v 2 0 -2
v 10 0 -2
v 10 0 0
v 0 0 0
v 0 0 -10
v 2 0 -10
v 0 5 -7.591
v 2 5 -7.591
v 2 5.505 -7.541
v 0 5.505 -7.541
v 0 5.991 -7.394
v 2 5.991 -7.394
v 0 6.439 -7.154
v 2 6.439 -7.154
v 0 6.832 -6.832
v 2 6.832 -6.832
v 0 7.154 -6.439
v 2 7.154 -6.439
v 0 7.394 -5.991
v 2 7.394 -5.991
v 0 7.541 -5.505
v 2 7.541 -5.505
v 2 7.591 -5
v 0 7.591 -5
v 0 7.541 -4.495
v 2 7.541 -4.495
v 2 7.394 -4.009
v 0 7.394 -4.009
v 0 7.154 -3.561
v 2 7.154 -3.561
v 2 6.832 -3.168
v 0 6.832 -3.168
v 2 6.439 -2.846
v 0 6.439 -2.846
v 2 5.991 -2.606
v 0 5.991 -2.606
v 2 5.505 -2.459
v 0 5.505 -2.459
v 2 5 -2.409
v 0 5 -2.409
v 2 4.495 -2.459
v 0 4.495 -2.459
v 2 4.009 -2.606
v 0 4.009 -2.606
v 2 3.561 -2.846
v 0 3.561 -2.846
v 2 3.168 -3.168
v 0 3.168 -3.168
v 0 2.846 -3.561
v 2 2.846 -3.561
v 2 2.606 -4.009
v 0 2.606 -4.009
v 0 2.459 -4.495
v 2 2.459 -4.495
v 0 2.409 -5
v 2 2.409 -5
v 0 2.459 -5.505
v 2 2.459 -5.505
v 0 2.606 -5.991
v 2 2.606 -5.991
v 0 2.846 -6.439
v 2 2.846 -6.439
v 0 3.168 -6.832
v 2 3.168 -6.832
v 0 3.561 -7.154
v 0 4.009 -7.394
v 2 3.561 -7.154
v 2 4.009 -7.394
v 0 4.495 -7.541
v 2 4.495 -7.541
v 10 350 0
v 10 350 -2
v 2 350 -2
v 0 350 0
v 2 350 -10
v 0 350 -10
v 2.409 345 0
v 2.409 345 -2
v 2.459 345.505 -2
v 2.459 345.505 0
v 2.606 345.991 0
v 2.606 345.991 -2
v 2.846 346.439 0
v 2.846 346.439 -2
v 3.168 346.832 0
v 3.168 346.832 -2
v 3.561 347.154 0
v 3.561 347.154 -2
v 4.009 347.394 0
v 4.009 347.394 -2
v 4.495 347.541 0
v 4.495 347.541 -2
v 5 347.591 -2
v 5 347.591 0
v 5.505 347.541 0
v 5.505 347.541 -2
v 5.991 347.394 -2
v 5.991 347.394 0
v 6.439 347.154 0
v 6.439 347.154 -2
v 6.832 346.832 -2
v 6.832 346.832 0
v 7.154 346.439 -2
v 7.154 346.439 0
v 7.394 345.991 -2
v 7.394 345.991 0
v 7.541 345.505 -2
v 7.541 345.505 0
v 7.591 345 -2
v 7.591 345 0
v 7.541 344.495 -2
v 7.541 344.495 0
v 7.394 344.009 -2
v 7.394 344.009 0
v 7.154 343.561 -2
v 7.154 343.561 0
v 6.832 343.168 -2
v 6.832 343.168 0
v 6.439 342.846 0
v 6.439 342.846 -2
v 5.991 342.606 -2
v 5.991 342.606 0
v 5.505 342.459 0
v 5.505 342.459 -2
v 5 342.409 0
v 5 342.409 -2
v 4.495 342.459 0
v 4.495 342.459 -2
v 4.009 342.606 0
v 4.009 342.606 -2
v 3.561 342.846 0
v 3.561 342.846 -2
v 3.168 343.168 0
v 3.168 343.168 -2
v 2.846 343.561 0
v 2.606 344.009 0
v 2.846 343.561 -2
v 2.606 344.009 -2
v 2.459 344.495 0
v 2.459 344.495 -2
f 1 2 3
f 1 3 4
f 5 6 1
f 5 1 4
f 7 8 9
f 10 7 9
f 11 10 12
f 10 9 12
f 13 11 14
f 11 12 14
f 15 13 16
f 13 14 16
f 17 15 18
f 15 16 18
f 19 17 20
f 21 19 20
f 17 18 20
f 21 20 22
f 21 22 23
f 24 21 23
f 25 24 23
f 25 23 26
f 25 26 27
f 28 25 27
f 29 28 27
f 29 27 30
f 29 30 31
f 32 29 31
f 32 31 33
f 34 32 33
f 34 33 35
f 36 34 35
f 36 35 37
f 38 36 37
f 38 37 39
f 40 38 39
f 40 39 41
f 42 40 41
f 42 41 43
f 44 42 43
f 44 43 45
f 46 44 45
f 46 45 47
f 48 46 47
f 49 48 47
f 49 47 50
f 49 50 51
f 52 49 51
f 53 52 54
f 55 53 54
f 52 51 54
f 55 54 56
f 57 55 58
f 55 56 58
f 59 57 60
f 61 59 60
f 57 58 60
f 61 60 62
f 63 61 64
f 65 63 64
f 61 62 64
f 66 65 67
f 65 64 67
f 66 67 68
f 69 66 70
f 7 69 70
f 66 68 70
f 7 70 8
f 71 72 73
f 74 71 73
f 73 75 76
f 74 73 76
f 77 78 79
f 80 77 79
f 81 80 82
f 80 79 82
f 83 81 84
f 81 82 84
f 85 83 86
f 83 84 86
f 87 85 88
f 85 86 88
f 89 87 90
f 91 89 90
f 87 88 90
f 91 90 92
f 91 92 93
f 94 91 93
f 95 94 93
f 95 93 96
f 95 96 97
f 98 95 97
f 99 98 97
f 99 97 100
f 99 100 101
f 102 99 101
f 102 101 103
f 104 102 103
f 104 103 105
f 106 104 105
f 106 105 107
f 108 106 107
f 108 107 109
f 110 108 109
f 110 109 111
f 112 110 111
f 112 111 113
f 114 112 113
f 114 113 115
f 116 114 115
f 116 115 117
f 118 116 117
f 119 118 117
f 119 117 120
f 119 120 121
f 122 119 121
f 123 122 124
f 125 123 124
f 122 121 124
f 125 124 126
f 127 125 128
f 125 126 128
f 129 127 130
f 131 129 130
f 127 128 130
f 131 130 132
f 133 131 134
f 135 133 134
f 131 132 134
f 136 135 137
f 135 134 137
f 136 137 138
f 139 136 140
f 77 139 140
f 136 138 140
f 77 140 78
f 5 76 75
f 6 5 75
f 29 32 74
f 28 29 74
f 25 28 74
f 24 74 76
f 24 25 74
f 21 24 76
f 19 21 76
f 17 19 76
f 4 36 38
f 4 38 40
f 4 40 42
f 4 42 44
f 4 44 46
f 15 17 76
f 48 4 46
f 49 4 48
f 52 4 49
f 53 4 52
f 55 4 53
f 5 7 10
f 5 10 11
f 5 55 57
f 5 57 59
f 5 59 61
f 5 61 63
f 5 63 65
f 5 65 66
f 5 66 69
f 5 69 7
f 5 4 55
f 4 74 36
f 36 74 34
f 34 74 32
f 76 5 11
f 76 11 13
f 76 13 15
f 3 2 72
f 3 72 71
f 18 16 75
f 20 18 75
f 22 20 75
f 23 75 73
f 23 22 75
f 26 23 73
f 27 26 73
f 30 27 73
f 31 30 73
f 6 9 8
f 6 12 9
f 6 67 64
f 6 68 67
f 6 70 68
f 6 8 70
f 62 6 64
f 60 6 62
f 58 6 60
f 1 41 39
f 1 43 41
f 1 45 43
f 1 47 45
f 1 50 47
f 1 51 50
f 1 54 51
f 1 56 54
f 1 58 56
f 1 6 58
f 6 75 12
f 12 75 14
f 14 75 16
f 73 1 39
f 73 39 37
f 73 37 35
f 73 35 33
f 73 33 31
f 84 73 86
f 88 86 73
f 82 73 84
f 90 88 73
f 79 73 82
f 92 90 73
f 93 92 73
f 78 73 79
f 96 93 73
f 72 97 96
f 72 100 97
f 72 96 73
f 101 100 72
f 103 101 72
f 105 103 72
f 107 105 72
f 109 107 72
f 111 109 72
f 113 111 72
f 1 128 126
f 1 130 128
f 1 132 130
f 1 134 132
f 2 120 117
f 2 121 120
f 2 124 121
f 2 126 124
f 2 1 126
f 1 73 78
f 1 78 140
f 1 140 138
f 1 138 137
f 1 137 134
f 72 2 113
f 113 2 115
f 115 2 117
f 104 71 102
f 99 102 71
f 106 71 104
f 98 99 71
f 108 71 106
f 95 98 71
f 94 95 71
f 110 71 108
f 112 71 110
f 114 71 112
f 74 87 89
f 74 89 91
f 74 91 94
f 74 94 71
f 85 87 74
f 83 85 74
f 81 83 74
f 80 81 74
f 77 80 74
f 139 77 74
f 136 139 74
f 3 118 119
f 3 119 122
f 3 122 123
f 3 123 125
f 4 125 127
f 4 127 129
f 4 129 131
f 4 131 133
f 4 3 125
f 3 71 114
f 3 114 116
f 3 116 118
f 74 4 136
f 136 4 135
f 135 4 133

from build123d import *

# Parameters (mm, degrees)
BOSS_EXTRUDE1_DEPTH        = 350
F_6_0_204_DIAMETER_HOLE2_D = 5.1816
F_6_0_204_DIAMETER_HOLE3_D = 5.1816


with BuildPart() as part:
    # Sketch1 → Boss-Extrude1 (new body)
    with BuildSketch(Plane(origin=(0, 0, 0), x_dir=(1, 0, 0), z_dir=(0, 1, 0))):
        Polygon((0, 0), (0, 10), (2, 10), (2, 2), (10, 2), (10, 0), align=None)
    extrude(amount=BOSS_EXTRUDE1_DEPTH)

    # #6 (0.204) Diameter Hole2 (through all)
    with Locations(Plane.ZY):
        with Locations((-5, 5)):
            Hole(F_6_0_204_DIAMETER_HOLE2_D / 2)

    # #6 (0.204) Diameter Hole3 (through all)
    with Locations(Plane.XY):
        with Locations((5, 345)):
            Hole(F_6_0_204_DIAMETER_HOLE3_D / 2)


solid = part.part
